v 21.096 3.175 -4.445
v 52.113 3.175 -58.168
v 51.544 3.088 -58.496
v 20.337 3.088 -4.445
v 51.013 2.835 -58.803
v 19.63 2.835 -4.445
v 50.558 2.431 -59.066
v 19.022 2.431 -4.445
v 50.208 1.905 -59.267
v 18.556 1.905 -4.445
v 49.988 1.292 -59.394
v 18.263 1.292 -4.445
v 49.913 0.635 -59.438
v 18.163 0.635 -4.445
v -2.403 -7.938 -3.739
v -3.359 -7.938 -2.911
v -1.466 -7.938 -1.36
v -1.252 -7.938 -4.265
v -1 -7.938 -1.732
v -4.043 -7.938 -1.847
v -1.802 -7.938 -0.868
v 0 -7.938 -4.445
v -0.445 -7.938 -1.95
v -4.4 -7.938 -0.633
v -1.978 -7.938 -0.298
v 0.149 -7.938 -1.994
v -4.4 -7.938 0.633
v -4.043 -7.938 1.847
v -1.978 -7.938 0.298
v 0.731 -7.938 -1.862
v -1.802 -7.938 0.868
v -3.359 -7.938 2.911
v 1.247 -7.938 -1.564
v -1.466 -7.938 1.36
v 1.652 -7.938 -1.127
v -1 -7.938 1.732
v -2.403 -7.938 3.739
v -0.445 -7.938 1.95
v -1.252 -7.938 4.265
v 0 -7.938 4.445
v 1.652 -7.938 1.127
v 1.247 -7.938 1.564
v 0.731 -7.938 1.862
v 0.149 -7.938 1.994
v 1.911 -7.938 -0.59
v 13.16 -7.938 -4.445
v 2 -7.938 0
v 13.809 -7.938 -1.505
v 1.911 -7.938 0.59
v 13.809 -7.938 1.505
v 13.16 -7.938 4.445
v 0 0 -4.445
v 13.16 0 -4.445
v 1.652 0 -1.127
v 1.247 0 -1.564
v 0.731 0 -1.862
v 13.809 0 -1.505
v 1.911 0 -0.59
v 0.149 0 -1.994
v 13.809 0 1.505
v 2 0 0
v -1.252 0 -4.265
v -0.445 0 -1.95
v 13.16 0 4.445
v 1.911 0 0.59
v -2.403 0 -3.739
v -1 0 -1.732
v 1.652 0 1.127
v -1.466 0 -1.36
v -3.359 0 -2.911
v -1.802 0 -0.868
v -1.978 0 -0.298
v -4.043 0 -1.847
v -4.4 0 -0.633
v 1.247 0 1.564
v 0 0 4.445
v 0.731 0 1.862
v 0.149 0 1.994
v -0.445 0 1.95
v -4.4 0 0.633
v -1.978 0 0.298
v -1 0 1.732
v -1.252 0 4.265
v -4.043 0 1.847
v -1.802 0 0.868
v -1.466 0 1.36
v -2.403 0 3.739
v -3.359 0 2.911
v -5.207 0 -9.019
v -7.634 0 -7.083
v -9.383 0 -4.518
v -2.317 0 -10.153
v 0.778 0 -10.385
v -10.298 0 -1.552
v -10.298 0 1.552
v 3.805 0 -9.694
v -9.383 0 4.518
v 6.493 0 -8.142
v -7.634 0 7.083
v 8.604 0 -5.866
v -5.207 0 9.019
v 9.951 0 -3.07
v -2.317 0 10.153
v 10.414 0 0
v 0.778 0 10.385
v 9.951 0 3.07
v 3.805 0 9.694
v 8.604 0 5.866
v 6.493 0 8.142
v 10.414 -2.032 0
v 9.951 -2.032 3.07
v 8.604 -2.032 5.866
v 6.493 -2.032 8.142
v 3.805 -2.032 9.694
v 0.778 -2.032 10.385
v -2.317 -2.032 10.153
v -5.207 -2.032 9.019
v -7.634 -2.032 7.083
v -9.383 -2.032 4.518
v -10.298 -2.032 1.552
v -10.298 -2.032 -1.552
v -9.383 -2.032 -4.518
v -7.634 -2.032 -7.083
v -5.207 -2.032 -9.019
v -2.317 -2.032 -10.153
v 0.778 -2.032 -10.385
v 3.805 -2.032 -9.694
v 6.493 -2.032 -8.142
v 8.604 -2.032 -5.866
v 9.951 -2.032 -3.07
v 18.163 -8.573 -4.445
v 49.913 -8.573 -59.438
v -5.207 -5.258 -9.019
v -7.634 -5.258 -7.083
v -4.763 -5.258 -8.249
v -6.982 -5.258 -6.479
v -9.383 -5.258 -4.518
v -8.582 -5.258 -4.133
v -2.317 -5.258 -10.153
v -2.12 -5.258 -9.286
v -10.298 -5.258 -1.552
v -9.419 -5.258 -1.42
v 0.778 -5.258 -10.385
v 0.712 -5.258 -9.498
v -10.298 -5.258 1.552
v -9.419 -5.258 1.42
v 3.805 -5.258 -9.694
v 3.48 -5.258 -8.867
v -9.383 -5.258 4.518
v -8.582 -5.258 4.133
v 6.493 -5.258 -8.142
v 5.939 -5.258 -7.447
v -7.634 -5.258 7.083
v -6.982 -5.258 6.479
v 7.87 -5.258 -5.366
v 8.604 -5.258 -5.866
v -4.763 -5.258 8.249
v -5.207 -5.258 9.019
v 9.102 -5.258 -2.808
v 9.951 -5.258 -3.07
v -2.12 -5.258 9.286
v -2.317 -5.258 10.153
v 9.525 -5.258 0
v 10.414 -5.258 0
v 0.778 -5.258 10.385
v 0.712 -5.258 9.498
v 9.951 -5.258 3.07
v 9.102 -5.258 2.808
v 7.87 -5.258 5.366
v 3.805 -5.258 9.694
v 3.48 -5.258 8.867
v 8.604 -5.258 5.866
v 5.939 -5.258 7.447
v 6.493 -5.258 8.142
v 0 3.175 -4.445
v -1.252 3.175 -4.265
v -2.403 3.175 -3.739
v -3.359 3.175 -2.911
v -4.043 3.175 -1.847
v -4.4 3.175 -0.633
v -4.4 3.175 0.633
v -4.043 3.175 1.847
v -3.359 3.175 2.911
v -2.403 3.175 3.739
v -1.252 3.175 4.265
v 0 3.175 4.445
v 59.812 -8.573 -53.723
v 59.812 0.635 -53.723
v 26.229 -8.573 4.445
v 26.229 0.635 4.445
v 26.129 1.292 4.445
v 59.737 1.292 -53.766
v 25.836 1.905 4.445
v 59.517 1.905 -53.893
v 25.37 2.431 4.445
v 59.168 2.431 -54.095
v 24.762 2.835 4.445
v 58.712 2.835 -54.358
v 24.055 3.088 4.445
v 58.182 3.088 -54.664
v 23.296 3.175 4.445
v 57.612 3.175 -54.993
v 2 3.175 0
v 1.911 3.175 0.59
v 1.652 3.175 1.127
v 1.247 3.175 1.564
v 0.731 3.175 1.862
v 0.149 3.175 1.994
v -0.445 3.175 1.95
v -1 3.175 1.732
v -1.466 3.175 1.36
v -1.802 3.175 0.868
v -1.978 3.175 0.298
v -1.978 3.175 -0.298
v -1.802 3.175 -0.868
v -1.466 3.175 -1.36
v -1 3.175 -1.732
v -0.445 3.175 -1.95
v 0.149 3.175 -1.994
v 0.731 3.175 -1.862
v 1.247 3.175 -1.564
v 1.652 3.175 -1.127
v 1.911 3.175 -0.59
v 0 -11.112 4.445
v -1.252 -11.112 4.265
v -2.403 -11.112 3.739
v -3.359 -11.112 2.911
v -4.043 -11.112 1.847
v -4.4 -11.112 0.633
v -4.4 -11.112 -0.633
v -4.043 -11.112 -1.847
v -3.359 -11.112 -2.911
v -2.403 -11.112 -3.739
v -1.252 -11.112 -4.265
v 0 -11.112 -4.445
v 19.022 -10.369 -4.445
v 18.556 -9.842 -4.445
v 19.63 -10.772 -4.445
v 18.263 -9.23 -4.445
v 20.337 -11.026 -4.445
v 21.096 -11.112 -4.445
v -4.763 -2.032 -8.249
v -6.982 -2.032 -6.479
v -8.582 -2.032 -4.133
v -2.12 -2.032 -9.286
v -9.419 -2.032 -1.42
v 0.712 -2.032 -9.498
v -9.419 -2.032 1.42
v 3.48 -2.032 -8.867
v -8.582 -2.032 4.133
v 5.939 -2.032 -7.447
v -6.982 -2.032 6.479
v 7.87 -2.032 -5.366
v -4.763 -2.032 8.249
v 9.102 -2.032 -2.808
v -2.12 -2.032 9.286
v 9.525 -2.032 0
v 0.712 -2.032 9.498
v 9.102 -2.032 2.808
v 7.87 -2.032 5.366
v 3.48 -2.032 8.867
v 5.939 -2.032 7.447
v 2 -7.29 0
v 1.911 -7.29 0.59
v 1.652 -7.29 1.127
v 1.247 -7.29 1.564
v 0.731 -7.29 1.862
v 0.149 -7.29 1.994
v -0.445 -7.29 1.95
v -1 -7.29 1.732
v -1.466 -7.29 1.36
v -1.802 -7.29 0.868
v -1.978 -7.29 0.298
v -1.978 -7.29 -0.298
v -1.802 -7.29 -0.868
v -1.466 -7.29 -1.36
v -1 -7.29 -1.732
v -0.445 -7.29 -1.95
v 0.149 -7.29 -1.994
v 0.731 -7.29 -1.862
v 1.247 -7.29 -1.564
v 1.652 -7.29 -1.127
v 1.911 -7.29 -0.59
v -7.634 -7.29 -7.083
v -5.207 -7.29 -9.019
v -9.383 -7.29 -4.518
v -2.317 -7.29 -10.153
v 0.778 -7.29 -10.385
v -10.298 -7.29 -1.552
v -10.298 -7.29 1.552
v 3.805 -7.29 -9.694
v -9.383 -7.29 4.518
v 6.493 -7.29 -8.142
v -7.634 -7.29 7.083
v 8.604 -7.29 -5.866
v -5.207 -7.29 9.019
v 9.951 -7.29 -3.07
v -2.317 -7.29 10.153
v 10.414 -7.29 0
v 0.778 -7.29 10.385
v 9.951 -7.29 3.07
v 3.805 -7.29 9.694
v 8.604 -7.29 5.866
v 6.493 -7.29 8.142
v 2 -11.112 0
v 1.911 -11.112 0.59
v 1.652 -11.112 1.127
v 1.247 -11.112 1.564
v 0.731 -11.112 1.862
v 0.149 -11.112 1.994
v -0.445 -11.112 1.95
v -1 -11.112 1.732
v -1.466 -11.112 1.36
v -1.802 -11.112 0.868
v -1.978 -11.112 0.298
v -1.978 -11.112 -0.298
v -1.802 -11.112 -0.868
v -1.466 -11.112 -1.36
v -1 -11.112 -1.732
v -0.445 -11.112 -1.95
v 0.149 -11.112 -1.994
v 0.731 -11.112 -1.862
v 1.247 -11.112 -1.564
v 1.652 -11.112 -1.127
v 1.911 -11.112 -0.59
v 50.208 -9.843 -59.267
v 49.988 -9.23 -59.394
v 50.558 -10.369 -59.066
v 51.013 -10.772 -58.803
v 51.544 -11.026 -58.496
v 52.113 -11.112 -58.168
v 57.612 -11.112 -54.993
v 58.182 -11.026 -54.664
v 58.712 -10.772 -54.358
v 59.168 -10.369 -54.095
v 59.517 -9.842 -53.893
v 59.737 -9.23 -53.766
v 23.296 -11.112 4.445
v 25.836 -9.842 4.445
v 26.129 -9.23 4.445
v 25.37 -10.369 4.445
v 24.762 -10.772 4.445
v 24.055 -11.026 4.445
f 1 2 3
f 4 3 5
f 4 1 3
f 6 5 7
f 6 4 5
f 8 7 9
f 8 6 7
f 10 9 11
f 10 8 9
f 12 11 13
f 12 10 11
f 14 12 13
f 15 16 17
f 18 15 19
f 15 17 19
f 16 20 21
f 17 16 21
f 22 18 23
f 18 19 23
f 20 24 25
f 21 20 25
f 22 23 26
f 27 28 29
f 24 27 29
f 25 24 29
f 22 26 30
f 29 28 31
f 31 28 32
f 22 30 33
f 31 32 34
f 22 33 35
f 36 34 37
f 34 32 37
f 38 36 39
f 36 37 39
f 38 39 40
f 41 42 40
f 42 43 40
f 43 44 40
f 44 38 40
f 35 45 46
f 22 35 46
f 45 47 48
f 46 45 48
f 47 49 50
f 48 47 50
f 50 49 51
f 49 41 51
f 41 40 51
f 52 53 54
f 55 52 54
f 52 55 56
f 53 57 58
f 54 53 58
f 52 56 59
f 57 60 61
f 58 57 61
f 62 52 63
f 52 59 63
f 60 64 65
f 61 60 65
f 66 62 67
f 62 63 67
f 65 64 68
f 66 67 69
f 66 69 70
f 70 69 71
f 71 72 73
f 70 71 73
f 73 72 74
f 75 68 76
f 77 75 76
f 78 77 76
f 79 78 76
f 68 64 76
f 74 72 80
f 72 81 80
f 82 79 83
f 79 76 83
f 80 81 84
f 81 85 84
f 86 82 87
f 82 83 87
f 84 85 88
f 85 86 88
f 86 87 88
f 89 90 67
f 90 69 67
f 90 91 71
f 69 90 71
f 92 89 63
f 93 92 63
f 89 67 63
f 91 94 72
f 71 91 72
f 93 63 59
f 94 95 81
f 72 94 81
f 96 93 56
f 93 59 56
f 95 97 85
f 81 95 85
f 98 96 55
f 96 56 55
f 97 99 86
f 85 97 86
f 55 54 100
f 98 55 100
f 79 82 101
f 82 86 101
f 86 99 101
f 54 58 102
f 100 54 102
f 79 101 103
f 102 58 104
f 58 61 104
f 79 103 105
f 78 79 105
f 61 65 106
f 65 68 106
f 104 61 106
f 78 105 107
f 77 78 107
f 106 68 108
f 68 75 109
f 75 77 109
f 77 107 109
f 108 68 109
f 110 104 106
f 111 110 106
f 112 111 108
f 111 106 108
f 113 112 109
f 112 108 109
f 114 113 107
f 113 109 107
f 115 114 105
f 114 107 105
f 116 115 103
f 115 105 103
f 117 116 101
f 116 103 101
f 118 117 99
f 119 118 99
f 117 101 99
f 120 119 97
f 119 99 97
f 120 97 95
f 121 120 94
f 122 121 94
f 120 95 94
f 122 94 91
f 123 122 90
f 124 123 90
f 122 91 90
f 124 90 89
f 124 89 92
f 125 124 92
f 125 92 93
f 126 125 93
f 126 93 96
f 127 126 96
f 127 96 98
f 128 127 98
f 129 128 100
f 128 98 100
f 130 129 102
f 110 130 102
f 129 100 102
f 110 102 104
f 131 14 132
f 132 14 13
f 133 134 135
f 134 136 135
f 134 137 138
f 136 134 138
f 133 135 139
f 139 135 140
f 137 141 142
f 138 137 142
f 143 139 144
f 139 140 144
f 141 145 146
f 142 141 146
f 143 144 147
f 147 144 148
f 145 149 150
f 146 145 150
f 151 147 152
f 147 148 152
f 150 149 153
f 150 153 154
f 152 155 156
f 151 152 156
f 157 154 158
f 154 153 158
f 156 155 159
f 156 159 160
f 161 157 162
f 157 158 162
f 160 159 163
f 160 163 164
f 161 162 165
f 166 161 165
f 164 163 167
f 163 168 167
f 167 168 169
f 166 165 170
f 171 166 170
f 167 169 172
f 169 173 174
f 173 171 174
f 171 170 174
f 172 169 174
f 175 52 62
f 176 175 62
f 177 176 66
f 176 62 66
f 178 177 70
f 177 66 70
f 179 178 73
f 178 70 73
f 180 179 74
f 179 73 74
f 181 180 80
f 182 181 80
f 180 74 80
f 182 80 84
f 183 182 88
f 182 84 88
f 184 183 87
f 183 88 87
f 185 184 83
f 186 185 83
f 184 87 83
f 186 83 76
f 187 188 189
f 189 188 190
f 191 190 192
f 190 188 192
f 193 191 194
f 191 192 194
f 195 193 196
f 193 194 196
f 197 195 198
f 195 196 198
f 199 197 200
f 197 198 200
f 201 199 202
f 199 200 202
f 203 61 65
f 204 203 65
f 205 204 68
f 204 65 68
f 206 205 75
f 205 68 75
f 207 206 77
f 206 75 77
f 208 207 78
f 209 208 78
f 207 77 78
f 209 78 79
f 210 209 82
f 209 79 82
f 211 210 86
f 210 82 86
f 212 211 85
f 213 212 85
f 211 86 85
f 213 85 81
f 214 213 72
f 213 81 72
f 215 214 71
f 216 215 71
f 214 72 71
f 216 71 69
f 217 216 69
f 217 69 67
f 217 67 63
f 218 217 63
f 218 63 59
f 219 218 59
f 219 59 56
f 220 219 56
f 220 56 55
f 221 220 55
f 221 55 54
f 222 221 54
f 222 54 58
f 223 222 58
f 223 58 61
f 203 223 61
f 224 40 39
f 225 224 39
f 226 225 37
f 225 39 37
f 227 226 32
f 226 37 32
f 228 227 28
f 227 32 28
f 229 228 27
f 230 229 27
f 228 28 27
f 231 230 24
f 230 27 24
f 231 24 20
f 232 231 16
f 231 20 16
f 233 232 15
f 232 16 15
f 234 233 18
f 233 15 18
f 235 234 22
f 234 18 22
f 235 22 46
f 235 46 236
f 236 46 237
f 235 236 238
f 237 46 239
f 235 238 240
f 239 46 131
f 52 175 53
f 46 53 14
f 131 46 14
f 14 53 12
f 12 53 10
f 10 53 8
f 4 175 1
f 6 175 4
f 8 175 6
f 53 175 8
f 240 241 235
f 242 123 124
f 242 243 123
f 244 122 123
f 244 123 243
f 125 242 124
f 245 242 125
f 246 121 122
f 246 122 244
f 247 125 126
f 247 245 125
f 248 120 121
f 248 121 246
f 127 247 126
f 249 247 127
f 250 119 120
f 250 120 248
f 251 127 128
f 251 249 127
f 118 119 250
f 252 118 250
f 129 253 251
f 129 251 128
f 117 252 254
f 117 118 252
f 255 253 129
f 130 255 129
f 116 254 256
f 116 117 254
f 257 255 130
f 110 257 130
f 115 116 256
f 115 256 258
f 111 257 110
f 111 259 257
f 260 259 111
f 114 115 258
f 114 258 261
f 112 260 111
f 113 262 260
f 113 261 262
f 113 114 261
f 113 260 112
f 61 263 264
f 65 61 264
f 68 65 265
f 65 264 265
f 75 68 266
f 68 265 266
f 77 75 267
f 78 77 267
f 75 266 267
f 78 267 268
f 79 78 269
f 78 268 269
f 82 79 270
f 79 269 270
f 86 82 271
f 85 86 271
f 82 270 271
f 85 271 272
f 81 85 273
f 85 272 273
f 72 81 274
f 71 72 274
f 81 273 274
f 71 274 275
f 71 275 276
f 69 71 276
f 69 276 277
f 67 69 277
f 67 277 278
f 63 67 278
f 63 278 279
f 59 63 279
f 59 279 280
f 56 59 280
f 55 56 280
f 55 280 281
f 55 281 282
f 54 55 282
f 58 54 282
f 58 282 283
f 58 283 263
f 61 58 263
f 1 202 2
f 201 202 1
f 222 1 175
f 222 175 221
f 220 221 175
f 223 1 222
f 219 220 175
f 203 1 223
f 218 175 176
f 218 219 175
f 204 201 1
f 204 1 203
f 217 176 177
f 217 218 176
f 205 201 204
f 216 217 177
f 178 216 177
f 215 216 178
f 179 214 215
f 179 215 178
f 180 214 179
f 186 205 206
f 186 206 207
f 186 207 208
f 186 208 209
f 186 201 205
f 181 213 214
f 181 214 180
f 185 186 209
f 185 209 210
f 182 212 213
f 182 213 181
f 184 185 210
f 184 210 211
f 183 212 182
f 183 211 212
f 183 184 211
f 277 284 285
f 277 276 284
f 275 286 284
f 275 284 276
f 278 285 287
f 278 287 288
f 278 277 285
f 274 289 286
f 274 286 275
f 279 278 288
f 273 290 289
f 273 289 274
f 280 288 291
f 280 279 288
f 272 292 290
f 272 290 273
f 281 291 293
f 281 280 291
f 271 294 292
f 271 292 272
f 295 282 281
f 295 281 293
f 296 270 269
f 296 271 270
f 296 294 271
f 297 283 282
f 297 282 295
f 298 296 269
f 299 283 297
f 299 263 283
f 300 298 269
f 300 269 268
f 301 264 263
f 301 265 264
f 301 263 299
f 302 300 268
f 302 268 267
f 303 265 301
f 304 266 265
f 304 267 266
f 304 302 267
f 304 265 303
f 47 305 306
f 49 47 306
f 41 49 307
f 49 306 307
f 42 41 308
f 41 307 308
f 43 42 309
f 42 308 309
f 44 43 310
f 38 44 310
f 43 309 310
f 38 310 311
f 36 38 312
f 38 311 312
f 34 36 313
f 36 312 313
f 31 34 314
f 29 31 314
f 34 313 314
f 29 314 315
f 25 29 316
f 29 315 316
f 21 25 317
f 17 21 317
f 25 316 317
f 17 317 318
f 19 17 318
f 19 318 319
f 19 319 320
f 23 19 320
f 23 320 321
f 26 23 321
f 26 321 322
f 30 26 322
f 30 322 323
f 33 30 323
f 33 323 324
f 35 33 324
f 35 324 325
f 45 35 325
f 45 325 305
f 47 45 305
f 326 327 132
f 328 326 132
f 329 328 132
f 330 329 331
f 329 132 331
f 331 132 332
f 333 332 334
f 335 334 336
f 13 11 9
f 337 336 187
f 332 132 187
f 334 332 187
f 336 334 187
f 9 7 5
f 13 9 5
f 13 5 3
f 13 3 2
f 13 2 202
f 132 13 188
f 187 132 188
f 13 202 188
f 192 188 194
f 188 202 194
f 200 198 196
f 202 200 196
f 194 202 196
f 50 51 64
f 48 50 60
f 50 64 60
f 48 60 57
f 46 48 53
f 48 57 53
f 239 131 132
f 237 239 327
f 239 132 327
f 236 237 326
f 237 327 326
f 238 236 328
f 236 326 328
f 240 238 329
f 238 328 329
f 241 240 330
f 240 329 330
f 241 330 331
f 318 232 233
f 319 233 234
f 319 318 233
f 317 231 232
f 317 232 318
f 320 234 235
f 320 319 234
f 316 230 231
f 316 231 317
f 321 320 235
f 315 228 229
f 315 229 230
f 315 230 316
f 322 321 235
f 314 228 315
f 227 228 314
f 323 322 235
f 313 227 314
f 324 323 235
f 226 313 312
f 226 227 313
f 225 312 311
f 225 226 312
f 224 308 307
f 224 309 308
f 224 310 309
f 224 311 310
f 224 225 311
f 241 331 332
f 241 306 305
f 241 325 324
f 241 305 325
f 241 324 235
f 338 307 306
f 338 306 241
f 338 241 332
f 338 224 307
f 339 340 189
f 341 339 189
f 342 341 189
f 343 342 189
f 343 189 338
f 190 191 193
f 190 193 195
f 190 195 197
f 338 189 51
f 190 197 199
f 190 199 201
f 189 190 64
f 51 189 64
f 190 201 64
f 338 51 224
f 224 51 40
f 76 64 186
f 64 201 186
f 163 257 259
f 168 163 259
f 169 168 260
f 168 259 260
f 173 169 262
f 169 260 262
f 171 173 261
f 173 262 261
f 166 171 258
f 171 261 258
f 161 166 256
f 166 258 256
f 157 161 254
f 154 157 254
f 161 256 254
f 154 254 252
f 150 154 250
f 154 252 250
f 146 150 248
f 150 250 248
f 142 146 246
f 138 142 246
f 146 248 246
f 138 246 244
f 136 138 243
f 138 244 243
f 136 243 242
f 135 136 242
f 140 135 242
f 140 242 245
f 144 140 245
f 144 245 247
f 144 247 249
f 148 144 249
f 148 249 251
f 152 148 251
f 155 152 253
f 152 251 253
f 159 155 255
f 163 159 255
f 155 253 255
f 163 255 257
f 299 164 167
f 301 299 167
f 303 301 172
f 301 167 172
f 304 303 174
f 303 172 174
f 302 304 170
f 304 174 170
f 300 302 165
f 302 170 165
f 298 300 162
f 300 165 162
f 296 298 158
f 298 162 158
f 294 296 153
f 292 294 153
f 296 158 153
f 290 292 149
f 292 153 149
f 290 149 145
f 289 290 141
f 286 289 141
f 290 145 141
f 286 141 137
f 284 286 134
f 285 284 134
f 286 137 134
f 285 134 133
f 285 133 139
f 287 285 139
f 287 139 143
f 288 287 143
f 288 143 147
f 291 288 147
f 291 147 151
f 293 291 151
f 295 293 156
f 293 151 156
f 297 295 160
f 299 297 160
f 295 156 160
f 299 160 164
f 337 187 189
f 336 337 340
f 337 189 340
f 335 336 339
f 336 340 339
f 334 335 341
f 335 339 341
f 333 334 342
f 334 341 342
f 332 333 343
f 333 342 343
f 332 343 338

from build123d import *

# Parameters (mm, degrees)
F0_R      = 10.414
F1_DEPTH  = 2.032
F2_R      = 9.525
F3_DEPTH  = 3.2258
F4_R      = 10.414
F5_DEPTH  = 2.032
F6_R      = 2
F7_DEPTH  = 7.2908
F9_DEPTH  = 3.175
F11_DEPTH = 7.9375
F13_DEPTH = 3.175
F14_R     = 2.54
F15_R     = 2
F16_DEPTH = 14.2885


with BuildPart() as f1:
    # F0 (on Front) → F1 (new body)
    with BuildSketch(Plane.XZ):
        Circle(F0_R)
    extrude(amount=F1_DEPTH)

    # F2 (on face) → F3 (join)
    with BuildSketch(Plane.XZ.offset(2.032)):
        Circle(F2_R)
    extrude(amount=F3_DEPTH)

    # F4 (on face) → F5 (join)
    with BuildSketch(Plane.XZ.offset(5.2578)):
        Circle(F4_R)
    extrude(amount=F5_DEPTH)

    # F6 (on face) → F7 (cut, through all)
    with BuildSketch(Plane.XZ.offset(7.2898)):
        Circle(F6_R)
    extrude(amount=-F7_DEPTH, mode=Mode.SUBTRACT)


with BuildPart() as f9:
    # F8 (on face) → F9 (new body)
    with BuildSketch(Plane(origin=(0, 0, 0), x_dir=(-1, 0, 0), z_dir=(0, 1, 0))):
        with BuildLine():
            Line((-18.163297, -4.445), (0, -4.445))
            ThreePointArc((0, -4.445), (4.445, 0), (0, 4.445))
            Line((0, 4.445), (-26.228881, 4.445))
            Line((-26.228881, 4.445), (-59.811968, -53.722613))
            Line((-59.811968, -53.722613), (-49.913297, -59.437613))
            Line((-49.913297, -59.437613), (-18.163297, -4.445))
        make_face()
    extrude(amount=F9_DEPTH)

    # F10 (on face) → F11 (join)
    with BuildSketch(Plane.XZ):
        with BuildLine():
            Line((26.228881, 4.445), (13.160222, 4.445))
            ThreePointArc((13.160222, 4.445), (13.890625, 0), (13.160222, -4.445))
            Line((13.160222, -4.445), (18.163297, -4.445))
            Line((18.163297, -4.445), (49.913297, -59.437613))
            Line((49.913297, -59.437613), (59.811968, -53.722613))
            Line((59.811968, -53.722613), (26.228881, 4.445))
        make_face()
    extrude(amount=F11_DEPTH)

    # F12 (on face) → F13 (join)
    with BuildSketch(Plane.XZ.offset(7.9375)):
        with BuildLine():
            Line((0, -4.445), (18.163297, -4.445))
            Line((18.163297, -4.445), (49.913297, -59.437613))
            Line((49.913297, -59.437613), (59.811968, -53.722613))
            Line((59.811968, -53.722613), (26.228881, 4.445))
            Line((26.228881, 4.445), (0, 4.445))
            ThreePointArc((0, 4.445), (-4.445, 0), (0, -4.445))
        make_face()
    extrude(amount=F13_DEPTH)

    # F14
    f14_edges = [f9.edges().sort_by_distance(p)[0] for p in [
        (43.020424, -11.1125, -24.638807),
        (34.038297, -11.1125, -31.941307),
        (43.020424, 3.175, -24.638807),
        (34.038297, 3.175, -31.941307),
    ]]
    fillet(f14_edges, radius=F14_R)

    # F15 (on face) → F16 (cut, through all)
    with BuildSketch(Plane.XZ.offset(11.1125)):
        Circle(F15_R)
    extrude(amount=-F16_DEPTH, mode=Mode.SUBTRACT)


solid = Compound([f1.part, f9.part])
